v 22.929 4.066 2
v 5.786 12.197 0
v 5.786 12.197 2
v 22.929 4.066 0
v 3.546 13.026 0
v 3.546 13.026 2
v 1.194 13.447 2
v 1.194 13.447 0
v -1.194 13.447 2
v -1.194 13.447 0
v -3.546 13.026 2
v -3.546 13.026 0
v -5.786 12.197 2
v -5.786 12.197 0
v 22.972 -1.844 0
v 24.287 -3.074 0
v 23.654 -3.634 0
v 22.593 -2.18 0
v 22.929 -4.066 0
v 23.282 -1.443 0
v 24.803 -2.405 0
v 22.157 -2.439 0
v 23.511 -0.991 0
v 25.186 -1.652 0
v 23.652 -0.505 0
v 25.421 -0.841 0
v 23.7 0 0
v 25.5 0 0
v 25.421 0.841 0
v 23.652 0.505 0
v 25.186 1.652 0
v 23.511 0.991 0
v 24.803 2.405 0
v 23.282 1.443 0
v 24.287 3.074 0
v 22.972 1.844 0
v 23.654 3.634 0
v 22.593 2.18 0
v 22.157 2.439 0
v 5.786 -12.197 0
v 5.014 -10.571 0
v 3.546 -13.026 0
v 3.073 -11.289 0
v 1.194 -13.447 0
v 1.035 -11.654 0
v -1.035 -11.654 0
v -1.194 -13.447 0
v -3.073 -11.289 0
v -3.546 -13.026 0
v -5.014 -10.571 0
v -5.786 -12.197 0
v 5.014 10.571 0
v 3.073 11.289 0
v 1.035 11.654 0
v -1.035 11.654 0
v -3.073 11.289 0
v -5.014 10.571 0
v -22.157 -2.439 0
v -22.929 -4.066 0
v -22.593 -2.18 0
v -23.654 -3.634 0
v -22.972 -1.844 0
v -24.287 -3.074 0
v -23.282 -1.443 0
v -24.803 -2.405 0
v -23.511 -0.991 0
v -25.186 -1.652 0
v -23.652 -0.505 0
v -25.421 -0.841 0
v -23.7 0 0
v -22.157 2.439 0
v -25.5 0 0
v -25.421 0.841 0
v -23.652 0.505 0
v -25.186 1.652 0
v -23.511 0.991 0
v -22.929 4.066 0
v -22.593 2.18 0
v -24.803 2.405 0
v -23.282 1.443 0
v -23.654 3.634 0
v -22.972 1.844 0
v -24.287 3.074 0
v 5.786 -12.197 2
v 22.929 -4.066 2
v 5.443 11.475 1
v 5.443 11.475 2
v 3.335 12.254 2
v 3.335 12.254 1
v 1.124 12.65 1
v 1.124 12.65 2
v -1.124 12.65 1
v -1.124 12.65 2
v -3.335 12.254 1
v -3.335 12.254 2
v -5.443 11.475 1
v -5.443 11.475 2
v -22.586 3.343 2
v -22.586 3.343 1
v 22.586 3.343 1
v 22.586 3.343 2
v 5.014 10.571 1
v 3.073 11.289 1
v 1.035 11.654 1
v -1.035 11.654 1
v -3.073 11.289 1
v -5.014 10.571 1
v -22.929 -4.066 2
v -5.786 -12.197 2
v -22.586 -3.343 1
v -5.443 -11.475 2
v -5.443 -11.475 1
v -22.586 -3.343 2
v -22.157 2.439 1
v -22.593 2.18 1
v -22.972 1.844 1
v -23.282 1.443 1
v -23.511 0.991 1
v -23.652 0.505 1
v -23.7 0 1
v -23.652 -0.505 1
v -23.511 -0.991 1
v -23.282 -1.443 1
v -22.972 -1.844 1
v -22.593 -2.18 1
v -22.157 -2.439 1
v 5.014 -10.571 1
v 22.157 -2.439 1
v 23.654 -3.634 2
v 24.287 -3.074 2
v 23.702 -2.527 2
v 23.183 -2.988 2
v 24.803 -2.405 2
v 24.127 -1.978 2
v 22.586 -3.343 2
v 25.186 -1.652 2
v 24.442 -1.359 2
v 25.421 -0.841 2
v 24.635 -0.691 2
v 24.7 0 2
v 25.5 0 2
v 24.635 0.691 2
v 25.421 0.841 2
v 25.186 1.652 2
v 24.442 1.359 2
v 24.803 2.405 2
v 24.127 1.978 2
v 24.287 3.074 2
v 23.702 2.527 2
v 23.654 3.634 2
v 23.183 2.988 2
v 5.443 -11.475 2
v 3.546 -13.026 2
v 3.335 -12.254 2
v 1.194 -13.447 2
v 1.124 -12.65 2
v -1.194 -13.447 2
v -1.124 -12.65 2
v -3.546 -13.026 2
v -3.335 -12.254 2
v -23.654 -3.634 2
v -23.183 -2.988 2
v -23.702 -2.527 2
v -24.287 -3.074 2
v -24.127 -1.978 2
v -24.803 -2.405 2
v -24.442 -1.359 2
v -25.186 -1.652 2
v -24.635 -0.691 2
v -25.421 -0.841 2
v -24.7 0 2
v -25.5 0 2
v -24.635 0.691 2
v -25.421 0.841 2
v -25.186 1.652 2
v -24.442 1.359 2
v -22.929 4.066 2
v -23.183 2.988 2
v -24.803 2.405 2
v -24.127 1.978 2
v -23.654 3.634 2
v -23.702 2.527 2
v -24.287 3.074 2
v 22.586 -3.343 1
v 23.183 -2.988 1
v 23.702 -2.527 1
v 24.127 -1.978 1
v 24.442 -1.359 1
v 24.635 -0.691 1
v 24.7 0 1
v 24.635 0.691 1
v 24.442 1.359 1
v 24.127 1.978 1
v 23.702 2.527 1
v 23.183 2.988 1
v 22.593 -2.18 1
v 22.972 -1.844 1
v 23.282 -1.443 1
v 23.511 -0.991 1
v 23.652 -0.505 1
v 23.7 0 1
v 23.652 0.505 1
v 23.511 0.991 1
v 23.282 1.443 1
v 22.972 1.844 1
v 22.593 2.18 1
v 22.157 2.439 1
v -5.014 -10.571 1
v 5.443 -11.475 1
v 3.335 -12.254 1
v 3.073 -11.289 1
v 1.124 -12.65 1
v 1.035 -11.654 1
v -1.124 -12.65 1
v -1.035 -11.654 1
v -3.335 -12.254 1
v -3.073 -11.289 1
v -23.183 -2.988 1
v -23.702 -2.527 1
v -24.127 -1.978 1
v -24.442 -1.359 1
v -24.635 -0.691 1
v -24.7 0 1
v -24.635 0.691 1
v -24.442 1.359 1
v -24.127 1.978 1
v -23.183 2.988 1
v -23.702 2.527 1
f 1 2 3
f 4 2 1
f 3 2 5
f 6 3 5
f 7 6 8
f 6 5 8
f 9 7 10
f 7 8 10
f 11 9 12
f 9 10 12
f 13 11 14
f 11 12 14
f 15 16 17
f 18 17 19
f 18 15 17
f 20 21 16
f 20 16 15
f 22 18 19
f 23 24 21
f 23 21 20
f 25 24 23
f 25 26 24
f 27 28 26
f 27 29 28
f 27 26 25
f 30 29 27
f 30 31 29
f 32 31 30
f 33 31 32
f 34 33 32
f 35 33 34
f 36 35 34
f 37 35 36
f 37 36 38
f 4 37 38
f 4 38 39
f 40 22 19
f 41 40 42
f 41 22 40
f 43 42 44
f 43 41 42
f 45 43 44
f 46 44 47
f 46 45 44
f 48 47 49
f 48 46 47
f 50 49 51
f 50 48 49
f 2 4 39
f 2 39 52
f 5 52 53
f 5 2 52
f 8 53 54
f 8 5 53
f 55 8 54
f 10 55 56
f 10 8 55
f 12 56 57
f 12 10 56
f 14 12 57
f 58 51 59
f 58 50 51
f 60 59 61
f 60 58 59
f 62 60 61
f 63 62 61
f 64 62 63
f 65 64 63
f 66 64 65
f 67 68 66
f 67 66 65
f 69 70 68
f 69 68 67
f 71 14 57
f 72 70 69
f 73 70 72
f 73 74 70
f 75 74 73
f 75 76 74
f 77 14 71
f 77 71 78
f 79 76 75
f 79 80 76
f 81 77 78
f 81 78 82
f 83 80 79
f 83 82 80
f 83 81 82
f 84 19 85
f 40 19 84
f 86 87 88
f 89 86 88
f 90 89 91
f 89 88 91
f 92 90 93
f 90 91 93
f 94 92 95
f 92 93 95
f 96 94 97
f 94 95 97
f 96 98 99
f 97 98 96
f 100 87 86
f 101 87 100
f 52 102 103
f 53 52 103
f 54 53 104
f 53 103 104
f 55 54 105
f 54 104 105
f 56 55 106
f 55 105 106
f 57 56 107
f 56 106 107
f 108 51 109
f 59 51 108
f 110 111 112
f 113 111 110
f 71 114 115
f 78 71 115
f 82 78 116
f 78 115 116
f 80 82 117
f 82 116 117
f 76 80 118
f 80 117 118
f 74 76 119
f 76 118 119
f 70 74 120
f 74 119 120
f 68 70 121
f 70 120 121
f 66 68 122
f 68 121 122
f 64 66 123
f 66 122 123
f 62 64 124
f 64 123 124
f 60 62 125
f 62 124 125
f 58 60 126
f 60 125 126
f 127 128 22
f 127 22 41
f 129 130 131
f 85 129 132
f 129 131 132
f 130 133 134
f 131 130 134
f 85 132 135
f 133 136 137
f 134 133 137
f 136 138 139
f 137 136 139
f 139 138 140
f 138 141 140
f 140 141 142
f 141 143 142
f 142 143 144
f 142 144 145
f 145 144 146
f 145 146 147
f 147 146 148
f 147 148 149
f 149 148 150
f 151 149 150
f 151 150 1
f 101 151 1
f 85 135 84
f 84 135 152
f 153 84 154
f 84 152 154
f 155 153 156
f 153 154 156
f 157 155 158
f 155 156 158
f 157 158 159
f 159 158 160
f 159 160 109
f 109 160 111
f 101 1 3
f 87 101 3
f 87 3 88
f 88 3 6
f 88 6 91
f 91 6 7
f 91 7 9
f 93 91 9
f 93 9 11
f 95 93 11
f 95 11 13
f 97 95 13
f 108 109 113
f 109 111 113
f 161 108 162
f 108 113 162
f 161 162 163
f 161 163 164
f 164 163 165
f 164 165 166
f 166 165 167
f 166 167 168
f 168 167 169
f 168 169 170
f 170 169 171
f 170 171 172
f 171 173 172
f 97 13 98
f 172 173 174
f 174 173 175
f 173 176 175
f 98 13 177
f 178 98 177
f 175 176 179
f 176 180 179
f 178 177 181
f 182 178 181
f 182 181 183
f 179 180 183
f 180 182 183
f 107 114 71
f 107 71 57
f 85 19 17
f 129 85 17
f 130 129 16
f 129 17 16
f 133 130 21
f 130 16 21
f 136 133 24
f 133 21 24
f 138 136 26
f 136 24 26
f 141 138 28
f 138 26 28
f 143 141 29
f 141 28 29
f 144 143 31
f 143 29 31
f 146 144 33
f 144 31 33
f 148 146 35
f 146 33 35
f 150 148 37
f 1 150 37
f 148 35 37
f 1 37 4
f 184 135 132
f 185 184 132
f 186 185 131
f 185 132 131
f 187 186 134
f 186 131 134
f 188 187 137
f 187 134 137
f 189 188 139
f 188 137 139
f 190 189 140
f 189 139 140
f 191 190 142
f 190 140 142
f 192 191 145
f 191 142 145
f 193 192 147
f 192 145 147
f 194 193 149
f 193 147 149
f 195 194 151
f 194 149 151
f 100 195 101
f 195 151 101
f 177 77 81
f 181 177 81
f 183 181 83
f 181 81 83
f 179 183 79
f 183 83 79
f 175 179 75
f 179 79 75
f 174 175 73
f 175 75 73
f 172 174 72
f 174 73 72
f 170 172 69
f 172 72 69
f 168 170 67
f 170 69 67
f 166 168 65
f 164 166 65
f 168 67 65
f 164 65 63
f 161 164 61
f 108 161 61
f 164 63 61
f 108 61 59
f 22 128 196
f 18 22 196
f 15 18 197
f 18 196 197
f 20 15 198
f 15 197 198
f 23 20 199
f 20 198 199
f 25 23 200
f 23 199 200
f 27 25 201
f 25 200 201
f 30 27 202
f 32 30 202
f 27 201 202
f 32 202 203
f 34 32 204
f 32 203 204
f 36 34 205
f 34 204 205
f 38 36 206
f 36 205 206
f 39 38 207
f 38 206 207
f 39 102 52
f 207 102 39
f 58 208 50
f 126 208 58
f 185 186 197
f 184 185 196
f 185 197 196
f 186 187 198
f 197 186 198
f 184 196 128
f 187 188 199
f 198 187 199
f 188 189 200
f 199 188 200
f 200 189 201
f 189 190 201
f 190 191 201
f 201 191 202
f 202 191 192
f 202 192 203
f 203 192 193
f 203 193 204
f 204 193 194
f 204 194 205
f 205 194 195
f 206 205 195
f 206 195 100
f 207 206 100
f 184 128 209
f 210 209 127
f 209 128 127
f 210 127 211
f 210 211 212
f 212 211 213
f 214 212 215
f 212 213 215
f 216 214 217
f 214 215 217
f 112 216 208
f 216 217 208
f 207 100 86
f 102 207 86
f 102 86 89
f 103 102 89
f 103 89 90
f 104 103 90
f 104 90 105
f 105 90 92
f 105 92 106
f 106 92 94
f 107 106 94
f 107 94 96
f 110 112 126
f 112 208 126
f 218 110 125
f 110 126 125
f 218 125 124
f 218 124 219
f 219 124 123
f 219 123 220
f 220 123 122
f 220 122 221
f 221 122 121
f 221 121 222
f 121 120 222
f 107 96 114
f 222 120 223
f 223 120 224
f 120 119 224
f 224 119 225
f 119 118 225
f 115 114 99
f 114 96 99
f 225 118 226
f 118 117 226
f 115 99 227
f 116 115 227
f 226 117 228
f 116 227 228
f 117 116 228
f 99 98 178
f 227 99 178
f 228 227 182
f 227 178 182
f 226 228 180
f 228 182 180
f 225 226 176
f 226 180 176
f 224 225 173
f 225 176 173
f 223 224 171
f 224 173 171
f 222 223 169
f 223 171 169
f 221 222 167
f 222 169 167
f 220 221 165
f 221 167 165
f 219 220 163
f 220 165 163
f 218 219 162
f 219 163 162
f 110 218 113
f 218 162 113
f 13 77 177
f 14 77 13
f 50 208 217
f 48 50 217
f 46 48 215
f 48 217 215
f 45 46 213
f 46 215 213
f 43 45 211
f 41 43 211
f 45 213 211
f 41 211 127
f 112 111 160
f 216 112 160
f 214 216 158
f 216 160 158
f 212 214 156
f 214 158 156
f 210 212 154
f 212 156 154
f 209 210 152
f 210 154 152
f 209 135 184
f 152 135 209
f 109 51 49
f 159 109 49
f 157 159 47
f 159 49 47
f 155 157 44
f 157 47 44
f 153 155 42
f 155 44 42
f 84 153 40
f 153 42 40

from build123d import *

# Parameters (mm, degrees)
PAD_DEPTH       = 2
POCKET_DEPTH    = 1
POCKET001_DEPTH = 1.001


with BuildPart() as part:
    # Sketch → Pad (new body)
    with BuildSketch(Plane.XY):
        with BuildLine():
            Line((-22.928591, 4.065776), (-5.785719, 12.197355))
            ThreePointArc((5.785719, 12.197355), (0, 13.5), (-5.785719, 12.197355))
            Line((5.785719, 12.197355), (22.928591, 4.065776))
            ThreePointArc((22.928592, -4.065776), (25.5, 0), (22.928591, 4.065776))
            Line((22.928592, -4.065776), (5.785719, -12.197354))
            ThreePointArc((-5.785719, -12.197354), (0, -13.5), (5.785719, -12.197354))
            Line((-5.785719, -12.197354), (-22.928592, -4.065776))
            ThreePointArc((-22.928591, 4.065776), (-25.5, 0), (-22.928592, -4.065776))
        make_face()
    extrude(amount=PAD_DEPTH)

    # Sketch001 → Pocket (cut)
    with BuildSketch(Plane.XY.offset(2)):
        with BuildLine():
            Line((-22.58573, 3.342972), (-5.442864, 11.474547))
            ThreePointArc((5.442864, 11.474547), (0, 12.7), (-5.442864, 11.474547))
            Line((5.442864, 11.474547), (22.58573, 3.342972))
            ThreePointArc((22.58573, -3.342972), (24.7, 0), (22.58573, 3.342972))
            Line((22.58573, -3.342972), (5.442864, -11.474547))
            ThreePointArc((-5.442864, -11.474547), (0, -12.7), (5.442864, -11.474547))
            Line((-5.442864, -11.474547), (-22.58573, -3.342972))
            ThreePointArc((-22.58573, 3.342972), (-24.7, 0), (-22.58573, -3.342972))
        make_face()
    extrude(amount=-POCKET_DEPTH, mode=Mode.SUBTRACT)

    # Sketch002 → Pocket001 (cut, through all)
    with BuildSketch(Plane.XY.offset(1)):
        with BuildLine():
            Line((-22.157141, 2.439472), (-5.014263, 10.571053))
            ThreePointArc((5.014263, 10.571053), (0, 11.7), (-5.014263, 10.571053))
            Line((5.014263, 10.571053), (22.157141, 2.439472))
            ThreePointArc((22.157142, -2.439472), (23.7, 1e-06), (22.157141, 2.439472))
            Line((22.157142, -2.439472), (5.014261, -10.571054))
            ThreePointArc((-5.014261, -10.571054), (0, -11.7), (5.014261, -10.571054))
            Line((-5.014261, -10.571054), (-22.157142, -2.439472))
            ThreePointArc((-22.157141, 2.439472), (-23.7, 1e-06), (-22.157142, -2.439472))
        make_face()
    extrude(amount=-POCKET001_DEPTH, mode=Mode.SUBTRACT)


solid = part.part
